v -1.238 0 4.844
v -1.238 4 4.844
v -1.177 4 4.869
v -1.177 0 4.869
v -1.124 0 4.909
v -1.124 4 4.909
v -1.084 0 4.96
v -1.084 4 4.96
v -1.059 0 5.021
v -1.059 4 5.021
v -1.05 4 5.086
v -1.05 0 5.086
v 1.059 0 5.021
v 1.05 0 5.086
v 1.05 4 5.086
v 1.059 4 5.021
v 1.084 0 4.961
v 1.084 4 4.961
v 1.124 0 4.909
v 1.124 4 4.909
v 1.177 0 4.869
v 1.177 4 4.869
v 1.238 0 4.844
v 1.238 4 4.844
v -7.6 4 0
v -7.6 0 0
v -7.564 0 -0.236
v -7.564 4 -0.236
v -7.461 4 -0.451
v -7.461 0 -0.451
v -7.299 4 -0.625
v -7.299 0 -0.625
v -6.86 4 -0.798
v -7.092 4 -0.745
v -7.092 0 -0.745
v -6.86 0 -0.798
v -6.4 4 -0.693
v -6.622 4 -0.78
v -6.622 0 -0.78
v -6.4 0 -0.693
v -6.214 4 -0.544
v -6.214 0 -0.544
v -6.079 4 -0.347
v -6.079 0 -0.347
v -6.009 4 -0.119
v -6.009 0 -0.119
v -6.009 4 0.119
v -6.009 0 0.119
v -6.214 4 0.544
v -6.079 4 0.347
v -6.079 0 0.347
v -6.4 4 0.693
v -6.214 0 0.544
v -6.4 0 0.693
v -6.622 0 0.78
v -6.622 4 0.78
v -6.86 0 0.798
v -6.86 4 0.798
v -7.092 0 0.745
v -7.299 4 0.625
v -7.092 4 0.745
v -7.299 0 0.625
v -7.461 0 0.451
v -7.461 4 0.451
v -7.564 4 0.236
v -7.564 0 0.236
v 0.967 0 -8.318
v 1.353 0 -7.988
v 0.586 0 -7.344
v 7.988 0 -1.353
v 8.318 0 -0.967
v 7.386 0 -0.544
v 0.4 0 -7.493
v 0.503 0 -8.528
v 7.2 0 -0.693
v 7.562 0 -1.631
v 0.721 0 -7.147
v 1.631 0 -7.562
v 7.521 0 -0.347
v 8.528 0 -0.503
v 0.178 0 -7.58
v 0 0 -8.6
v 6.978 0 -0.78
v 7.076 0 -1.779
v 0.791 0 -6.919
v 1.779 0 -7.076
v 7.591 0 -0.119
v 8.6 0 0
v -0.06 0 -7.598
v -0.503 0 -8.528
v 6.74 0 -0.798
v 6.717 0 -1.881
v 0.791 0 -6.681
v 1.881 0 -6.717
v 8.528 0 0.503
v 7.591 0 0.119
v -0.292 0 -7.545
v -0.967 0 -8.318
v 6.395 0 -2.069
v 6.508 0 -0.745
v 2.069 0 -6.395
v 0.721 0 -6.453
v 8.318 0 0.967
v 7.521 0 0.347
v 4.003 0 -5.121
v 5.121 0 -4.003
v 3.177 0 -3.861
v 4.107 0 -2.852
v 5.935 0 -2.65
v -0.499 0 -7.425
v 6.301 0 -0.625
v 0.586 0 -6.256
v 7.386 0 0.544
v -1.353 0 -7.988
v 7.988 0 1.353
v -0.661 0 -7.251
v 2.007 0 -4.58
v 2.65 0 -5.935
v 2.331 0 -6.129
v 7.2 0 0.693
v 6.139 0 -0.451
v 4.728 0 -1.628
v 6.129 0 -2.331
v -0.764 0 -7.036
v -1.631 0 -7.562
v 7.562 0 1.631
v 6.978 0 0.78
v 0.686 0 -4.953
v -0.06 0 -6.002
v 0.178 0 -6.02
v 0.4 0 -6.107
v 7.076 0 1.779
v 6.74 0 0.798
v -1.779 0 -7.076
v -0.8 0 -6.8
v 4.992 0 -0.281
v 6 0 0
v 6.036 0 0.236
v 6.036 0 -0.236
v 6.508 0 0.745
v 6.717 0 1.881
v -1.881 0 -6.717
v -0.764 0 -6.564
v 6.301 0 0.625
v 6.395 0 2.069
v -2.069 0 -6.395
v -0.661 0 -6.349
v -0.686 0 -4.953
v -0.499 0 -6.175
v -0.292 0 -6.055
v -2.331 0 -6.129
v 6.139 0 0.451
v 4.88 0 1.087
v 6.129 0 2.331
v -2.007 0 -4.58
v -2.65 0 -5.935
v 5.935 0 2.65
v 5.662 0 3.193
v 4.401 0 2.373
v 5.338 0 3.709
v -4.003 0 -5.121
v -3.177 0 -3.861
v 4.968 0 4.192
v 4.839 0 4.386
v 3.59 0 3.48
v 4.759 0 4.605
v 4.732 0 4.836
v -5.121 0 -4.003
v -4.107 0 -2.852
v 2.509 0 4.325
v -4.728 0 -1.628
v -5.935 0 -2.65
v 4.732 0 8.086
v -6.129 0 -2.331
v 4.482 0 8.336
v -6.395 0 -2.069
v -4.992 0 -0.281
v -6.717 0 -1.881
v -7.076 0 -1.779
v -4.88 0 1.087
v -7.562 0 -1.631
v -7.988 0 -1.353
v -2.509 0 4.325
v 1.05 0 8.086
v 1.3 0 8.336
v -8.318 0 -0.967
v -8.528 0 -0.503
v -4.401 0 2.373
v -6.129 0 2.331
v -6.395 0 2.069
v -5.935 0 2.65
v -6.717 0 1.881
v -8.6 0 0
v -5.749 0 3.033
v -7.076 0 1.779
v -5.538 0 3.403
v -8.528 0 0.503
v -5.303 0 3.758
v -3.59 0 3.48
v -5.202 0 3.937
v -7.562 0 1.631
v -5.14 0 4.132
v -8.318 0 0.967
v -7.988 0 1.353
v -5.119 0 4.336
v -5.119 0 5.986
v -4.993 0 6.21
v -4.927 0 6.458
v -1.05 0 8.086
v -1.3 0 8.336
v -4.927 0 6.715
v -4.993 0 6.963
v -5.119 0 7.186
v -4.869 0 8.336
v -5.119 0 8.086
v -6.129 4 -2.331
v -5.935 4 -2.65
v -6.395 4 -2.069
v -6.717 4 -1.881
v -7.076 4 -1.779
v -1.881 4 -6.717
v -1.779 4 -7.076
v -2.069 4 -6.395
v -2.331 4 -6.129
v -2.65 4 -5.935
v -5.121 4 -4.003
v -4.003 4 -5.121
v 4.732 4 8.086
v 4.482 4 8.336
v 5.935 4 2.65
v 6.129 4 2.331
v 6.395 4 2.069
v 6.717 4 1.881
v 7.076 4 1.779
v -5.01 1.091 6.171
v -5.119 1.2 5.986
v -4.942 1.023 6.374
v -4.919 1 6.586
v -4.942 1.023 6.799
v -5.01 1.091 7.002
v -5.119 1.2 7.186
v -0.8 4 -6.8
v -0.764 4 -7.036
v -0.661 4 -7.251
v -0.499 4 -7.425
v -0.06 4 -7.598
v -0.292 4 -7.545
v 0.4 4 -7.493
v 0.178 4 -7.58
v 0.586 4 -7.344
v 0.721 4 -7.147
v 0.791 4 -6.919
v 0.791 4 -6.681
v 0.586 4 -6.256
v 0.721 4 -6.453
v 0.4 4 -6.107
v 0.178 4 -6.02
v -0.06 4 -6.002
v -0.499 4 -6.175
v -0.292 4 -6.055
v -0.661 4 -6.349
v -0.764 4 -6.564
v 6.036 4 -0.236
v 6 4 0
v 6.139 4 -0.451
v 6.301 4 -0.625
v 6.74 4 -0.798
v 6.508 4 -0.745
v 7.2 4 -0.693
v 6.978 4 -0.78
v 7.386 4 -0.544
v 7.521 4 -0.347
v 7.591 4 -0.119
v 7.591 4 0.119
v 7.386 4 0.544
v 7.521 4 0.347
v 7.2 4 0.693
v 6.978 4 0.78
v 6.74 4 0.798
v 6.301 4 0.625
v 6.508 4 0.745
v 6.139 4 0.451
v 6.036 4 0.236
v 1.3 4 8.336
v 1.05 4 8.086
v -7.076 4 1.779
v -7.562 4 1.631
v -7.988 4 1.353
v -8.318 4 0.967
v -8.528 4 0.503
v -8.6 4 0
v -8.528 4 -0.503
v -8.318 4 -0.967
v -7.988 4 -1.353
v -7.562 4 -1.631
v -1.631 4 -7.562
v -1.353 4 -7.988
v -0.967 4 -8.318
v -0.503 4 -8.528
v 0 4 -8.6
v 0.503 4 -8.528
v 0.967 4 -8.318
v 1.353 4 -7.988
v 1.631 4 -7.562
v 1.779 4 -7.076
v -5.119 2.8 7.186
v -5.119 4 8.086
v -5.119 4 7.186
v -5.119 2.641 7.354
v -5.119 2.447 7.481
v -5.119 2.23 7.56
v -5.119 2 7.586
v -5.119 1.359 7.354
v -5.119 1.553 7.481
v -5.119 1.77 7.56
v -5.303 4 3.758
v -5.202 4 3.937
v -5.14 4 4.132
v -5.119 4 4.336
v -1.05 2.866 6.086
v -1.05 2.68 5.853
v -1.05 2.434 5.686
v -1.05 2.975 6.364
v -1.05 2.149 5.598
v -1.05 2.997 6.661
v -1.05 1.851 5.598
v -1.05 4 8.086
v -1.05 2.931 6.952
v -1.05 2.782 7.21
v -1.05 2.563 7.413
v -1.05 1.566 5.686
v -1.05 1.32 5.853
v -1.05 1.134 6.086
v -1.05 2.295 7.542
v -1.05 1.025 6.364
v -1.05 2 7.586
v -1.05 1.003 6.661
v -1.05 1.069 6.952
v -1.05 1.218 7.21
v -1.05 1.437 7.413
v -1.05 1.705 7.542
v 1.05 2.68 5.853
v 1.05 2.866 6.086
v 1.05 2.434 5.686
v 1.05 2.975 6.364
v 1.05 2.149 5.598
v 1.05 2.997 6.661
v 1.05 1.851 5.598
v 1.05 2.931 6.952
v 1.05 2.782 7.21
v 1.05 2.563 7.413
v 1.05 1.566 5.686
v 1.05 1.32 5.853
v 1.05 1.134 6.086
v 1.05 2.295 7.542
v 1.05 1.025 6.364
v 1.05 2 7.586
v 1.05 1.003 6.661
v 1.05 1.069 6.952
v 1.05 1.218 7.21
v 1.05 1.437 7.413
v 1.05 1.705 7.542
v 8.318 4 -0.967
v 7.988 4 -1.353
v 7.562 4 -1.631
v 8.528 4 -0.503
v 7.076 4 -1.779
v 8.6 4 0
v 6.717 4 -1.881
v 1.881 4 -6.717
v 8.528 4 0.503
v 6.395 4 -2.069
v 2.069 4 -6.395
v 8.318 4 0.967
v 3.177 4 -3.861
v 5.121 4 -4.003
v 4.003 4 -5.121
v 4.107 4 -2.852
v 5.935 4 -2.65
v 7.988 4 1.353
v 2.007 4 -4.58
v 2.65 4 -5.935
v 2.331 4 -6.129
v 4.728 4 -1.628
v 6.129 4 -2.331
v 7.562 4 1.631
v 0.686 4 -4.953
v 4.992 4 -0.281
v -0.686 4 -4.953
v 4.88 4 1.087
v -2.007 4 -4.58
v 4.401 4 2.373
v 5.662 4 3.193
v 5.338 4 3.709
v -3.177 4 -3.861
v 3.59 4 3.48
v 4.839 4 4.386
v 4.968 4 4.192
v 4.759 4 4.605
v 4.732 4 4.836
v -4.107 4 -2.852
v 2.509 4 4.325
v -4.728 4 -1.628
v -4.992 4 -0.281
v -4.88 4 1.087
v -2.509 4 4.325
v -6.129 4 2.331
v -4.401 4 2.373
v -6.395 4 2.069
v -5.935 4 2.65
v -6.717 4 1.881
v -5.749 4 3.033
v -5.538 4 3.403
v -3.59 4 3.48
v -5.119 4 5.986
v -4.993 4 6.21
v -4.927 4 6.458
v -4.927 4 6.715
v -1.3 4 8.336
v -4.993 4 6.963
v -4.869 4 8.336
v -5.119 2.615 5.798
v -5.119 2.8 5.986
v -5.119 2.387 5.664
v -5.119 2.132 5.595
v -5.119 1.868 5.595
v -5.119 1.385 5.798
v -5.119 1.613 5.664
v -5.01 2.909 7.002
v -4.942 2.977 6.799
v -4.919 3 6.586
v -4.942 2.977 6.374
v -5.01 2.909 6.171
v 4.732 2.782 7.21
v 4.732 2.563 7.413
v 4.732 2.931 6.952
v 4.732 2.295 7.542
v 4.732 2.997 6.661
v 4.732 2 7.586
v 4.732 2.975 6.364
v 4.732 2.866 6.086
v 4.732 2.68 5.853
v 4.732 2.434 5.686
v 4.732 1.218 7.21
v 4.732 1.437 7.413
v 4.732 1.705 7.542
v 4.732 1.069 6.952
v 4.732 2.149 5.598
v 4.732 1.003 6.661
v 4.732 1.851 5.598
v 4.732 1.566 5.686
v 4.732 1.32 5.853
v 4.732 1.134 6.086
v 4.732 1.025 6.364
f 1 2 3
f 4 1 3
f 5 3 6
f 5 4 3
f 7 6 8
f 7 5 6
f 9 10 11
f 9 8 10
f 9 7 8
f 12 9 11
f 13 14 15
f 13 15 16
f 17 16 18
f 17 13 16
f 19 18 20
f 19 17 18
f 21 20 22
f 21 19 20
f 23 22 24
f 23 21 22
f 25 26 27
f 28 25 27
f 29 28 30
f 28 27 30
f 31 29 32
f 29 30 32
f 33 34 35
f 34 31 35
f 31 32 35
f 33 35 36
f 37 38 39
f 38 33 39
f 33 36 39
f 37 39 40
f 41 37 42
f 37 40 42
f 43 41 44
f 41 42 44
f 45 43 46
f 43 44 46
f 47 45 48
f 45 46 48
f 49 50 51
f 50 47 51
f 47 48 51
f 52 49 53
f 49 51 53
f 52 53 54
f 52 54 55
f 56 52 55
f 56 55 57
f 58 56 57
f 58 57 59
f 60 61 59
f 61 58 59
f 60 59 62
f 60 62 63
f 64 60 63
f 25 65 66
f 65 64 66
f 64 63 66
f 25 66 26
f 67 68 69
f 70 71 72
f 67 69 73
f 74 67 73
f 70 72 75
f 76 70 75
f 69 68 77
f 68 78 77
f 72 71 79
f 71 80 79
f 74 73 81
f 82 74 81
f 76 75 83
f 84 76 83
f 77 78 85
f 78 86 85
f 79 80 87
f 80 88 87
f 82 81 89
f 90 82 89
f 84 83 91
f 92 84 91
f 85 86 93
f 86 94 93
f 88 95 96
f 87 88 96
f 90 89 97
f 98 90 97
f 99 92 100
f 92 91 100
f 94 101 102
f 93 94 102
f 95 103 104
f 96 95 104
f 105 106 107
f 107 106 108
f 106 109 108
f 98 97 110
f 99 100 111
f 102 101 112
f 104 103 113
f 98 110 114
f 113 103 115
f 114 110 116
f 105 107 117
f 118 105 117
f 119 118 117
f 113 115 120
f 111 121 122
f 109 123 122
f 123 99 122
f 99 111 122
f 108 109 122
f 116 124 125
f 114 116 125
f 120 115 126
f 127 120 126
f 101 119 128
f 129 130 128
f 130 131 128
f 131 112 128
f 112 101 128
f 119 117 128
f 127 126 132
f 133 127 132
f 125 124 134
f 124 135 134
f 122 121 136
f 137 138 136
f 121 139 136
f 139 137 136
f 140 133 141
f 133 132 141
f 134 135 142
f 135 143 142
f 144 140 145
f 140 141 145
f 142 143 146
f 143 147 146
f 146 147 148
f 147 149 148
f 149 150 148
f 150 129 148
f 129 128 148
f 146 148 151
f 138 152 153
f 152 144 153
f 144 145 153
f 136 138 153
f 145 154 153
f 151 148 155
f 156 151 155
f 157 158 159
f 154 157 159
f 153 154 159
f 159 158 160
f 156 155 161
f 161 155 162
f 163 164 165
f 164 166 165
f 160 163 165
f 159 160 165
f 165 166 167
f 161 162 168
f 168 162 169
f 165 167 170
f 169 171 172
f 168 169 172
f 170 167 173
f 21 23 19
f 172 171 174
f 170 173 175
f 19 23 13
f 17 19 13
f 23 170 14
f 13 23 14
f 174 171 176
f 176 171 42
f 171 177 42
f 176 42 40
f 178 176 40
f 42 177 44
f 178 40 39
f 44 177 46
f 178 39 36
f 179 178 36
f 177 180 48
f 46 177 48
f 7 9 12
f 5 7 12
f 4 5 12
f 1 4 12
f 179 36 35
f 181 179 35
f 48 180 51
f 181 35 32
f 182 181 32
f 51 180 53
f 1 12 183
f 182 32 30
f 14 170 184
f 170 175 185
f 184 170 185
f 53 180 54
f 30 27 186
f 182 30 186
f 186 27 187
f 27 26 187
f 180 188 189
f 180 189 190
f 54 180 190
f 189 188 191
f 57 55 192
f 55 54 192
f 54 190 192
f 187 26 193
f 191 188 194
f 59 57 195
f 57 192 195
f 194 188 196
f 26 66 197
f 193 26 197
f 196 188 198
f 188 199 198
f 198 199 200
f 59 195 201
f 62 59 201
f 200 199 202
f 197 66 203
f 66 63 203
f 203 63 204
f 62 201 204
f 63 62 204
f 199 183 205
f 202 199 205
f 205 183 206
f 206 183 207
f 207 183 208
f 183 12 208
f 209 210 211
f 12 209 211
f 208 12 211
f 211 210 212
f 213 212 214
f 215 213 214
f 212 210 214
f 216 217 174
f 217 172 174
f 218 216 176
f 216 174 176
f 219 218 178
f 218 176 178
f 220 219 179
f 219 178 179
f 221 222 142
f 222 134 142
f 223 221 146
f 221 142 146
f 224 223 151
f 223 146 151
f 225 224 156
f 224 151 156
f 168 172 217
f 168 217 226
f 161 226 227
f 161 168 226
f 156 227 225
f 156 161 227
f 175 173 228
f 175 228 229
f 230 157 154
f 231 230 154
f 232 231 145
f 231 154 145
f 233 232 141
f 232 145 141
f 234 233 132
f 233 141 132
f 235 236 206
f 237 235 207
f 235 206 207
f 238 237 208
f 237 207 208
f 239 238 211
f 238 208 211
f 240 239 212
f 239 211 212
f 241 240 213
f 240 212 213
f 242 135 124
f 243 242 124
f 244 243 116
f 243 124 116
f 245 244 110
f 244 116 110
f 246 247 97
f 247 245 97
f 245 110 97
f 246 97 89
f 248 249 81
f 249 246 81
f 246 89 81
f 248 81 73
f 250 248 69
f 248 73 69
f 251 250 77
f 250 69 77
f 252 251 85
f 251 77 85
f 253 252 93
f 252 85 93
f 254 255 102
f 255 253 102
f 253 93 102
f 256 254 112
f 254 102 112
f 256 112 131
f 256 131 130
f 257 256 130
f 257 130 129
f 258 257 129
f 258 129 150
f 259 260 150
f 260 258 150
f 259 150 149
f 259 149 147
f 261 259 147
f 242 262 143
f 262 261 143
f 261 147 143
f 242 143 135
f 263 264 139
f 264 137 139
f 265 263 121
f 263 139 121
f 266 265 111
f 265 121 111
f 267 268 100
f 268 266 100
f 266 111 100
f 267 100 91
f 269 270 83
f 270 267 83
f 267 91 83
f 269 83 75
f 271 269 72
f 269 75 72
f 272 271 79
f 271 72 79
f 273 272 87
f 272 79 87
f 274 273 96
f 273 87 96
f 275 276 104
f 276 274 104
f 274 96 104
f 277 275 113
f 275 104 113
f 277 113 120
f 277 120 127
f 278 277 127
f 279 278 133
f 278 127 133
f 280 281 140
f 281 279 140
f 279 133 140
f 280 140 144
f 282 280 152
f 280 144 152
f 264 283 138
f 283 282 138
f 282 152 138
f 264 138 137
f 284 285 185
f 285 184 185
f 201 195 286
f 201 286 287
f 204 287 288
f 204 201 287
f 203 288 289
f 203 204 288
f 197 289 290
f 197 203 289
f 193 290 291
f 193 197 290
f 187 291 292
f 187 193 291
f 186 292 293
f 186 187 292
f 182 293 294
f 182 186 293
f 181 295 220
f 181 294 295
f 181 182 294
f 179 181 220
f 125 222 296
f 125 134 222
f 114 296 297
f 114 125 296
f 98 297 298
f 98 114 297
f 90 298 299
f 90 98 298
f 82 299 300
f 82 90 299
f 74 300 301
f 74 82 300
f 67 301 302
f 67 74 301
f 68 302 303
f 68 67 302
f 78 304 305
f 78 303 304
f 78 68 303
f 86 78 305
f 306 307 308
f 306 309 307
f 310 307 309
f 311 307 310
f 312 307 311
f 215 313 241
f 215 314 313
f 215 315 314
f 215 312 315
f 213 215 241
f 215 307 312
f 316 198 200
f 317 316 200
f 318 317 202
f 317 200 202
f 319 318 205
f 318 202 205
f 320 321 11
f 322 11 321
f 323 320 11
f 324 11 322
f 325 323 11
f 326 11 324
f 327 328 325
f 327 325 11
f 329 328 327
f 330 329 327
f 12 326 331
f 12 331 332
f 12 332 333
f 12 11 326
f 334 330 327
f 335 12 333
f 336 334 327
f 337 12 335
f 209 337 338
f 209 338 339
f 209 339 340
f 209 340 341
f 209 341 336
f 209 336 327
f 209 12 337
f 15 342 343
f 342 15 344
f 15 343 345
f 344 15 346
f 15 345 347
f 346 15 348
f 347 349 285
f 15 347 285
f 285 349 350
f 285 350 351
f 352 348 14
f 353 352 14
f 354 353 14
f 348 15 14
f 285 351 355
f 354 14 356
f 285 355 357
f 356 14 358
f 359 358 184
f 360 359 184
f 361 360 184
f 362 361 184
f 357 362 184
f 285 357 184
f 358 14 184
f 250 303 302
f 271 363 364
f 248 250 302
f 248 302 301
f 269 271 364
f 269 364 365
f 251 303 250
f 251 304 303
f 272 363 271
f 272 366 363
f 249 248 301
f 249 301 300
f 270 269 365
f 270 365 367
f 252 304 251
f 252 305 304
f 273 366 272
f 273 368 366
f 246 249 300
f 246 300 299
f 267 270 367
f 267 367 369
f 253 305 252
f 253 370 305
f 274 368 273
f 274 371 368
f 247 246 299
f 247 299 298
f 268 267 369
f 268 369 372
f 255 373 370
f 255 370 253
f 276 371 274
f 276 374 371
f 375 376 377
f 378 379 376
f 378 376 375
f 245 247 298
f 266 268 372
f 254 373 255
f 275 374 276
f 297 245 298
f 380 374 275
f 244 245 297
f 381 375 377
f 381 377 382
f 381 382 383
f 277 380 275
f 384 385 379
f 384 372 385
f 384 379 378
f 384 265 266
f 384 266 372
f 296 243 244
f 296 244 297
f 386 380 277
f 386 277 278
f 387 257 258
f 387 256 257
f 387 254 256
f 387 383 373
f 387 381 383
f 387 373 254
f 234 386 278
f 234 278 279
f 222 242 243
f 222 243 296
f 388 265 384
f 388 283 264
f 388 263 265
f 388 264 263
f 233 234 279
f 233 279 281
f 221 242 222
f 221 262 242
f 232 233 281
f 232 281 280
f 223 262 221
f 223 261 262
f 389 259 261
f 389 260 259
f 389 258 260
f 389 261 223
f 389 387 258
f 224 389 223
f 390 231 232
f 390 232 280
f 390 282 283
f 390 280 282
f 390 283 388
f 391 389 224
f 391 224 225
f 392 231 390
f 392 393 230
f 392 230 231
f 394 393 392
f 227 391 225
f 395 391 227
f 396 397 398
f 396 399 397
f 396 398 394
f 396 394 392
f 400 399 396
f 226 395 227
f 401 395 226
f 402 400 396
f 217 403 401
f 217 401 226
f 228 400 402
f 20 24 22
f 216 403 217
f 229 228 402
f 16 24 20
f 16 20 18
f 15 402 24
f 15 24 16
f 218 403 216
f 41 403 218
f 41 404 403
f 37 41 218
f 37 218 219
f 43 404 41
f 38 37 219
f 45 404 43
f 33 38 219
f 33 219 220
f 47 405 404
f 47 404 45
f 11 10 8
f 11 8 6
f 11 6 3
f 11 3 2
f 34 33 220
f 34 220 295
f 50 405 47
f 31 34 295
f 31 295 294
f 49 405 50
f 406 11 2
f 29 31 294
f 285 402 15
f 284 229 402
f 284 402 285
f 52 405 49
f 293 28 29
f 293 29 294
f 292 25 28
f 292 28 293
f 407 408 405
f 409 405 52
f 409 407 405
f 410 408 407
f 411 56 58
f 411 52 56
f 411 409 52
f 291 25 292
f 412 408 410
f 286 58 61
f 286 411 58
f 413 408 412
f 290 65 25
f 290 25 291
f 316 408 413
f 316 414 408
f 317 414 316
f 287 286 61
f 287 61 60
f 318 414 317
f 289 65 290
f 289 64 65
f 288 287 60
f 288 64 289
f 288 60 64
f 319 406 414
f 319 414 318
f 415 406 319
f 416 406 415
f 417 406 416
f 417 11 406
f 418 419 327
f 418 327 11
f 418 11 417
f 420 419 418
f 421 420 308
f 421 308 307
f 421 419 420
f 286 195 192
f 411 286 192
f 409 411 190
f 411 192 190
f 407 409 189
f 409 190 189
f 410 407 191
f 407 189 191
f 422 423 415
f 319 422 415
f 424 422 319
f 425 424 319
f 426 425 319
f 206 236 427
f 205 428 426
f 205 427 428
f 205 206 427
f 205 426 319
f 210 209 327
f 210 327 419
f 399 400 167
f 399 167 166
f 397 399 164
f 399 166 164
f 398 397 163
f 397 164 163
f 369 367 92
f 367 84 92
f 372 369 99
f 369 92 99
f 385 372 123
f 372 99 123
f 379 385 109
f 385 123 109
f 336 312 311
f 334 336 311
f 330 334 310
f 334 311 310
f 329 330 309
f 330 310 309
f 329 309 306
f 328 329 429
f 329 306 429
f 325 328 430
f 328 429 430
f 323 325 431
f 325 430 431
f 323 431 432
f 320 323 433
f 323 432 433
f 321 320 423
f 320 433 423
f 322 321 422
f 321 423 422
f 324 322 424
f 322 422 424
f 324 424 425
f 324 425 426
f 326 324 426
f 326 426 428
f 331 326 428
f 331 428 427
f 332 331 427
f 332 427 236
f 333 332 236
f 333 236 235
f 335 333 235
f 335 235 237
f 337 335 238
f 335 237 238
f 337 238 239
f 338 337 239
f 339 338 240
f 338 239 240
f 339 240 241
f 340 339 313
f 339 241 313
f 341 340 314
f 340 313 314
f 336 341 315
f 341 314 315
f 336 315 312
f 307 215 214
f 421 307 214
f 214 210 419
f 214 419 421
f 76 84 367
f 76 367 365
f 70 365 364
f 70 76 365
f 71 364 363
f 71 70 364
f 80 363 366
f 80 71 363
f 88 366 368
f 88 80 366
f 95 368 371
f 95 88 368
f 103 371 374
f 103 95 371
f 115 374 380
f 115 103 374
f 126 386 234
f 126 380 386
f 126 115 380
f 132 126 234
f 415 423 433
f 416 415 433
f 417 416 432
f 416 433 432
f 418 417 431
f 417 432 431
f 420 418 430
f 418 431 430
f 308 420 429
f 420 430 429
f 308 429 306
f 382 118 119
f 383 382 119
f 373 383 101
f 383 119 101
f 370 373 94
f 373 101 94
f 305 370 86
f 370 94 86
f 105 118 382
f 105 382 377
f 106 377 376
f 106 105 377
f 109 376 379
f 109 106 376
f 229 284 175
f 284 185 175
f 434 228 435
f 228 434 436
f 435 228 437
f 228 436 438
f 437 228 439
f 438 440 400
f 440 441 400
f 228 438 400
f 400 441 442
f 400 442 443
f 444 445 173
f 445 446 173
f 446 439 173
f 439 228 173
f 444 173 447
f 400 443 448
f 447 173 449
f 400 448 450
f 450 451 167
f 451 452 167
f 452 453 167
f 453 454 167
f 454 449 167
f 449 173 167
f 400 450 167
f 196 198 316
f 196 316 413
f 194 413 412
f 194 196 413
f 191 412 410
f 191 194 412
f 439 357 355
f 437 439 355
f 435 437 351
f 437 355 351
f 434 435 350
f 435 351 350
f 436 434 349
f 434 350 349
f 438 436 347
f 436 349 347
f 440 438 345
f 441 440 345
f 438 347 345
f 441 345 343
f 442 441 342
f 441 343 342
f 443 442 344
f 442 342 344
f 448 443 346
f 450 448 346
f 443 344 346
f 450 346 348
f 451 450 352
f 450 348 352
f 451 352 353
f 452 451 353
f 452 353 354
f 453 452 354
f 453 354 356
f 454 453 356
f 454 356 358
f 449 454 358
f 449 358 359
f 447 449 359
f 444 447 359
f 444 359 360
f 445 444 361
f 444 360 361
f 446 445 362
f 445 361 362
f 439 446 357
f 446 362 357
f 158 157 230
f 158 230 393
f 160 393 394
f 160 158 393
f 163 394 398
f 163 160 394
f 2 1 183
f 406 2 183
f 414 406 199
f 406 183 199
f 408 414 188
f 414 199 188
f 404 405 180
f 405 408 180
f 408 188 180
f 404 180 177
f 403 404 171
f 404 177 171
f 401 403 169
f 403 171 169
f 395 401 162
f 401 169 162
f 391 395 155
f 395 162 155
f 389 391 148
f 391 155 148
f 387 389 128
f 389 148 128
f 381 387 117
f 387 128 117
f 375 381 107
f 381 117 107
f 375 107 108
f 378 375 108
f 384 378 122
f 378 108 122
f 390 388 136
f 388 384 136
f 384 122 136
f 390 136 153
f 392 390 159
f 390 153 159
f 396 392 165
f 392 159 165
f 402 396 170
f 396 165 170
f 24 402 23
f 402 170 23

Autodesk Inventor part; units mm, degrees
ref_plane "YZ Plane" through (0, 0, 0) normal (1, 0, 0) x (0, 1, 0)
ref_plane "XZ Plane" through (0, 0, 0) normal (0, 1, 0) x (-1, 0, 0)
ref_plane "XY Plane" through (0, 0, 0) normal (0, 0, 1) x (1, 0, 0)
sketch "スケッチ1" plane through (0, 0, 0) normal (0, 1, 0) x (-1, 0, 0)
  arc A0 (-1.2381, 4.8443) -> (1.2381, 4.8443) centre (0, 0) ccw
  line L0 (1.05, 5.0865) -> (1.05, 8.0865)
  line L1 (1.3, 8.3365) -> (4.8692, 8.3365)
  line L2 (-1.05, 5.0865) -> (-1.05, 8.0865)
  line L3 (-1.3, 8.3365) -> (-4.4822, 8.3365)
  line L4 (-4.7322, 8.0865) -> (-4.7322, 4.8365)
  line L5 (0, 0) -> (0, 8.2759) construction
  arc A1 (1.05, 5.0865) -> (1.2381, 4.8443) centre (1.3, 5.0865) ccw
  arc A2 (-1.2381, 4.8443) -> (-1.05, 5.0865) centre (-1.3, 5.0865) ccw
  arc A3 (-1.7788, -7.0755) -> (1.7788, -7.0755) centre (0, -6.8) ccw
  arc A4 (-4.9679, 4.1916) -> (-5.9354, 2.6497) centre (0, 0) ccw
  arc A5 (2.6497, -5.9354) -> (5.9354, -2.6497) centre (0, 0) ccw
  line L6 (0, -6.8) -> (0, 0) construction
  arc A6 (2.6497, -5.9354) -> (1.7788, -7.0755) centre (3.2611, -7.3051) ccw
  arc A7 (-1.7788, -7.0755) -> (-2.6497, -5.9354) centre (-3.2611, -7.3051) ccw
  circle A8 centre (0, -6.8) radius 0.8
  arc A9 (5.1192, 4.3365) -> (5.3033, 3.7583) centre (6.1192, 4.3365) ccw
  arc A10 (-4.9679, 4.1916) -> (-4.7322, 4.8365) centre (-5.7322, 4.8365) ccw
  line L7 (1.05, 8.0865) -> (1.3, 8.3365)
  line L8 (-1.05, 8.0865) -> (-1.3, 8.3365)
  arc A11 (5.1192, 7.1865) -> (5.1192, 5.9865) centre (5.9192, 6.5865) ccw
  line L9 (5.1192, 8.0865) -> (5.1192, 7.1865)
  line L10 (5.1192, 5.9865) -> (5.1192, 4.3365)
  line L11 (1.05, 6.5865) -> (5.9192, 6.5865) construction
  line L12 (5.1192, 8.0865) -> (4.8692, 8.3365)
  line L13 (-4.7322, 8.0865) -> (-4.4822, 8.3365)
  arc A12 (7.0755, -1.7788) -> (7.0755, 1.7788) centre (6.8, 0) ccw
  arc A13 (6.2684, -1.7197) -> (6.2684, 1.7197) centre (0, 0) ccw construction
  arc A14 (5.9354, 2.6497) -> (5.3033, 3.7583) centre (0, 0) ccw
  circle A15 centre (6.8, 0) radius 0.8
  arc A16 (7.0755, -1.7788) -> (5.9354, -2.6497) centre (7.3051, -3.2611) ccw
  arc A17 (5.9354, 2.6497) -> (7.0755, 1.7788) centre (7.3051, 3.2611) ccw
  line L14 (6.8, 0) -> (0, 0) construction
  arc A18 (-7.0755, 1.7788) -> (-7.0755, -1.7788) centre (-6.8, 0) ccw
  circle A19 centre (-6.8, 0) radius 0.8
  arc A20 (-5.9354, -2.6497) -> (-7.0755, -1.7788) centre (-7.3051, -3.2611) ccw
  arc A21 (-7.0755, 1.7788) -> (-5.9354, 2.6497) centre (-7.3051, 3.2611) ccw
  arc A22 (-5.9354, -2.6497) -> (-2.6497, -5.9354) centre (0, 0) ccw
  arc A23 (-5.9354, 2.6497) -> (-5.9354, -2.6497) centre (0, 0) ccw construction
  point P0 (-1.05, 4.8885)
  point P1 (1.05, 4.8885)
  point P2 (1.05, 8.3365)
  point P3 (5.1192, 8.3365)
  point P4 (5.1192, 4.0055)
  point P5 (-1.05, 8.3365)
  point P6 (-4.7322, 8.3365)
  point P7 (-4.7322, 4.456)
  dimension "d0" = 5
  dimension "d1" = 2.1
  dimension "d2" = 0.25
  dimension "d8" = 6.5
  dimension "d9" = 1.8
  dimension "d11" = 1.5
  dimension "d12" = 1.6
  dimension "d13" = 1
  dimension "d14" = 4
  dimension "d15" = 3.5
  dimension "d16" = 0.25
  dimension "d17" = 0.25
  dimension "d18" = 0.25
  dimension "d19" = 0.25
  dimension "d20" = 3
  dimension "d21" = 1
  dimension "d22" = 0.8
  dimension "d23" = 0.25
  dimension "d24" = 0.25
  dimension "d25" = 0.25
  dimension "d26" = 0.25
  dimension "d27" = 1.5
extrude "押し出し1" add sketch "スケッチ1" along normal blind 4
sketch "スケッチ2" plane through (-5.1192, 0, 7.1865) normal (-1, 0, 0) x (0, 0, 1)
  circle A0 centre (-0.6, 2) radius 1
  line L0 (-0.6, 2) -> (-0.6, 4) construction
  line L1 (-2.1, 4) -> (0.9, 4) construction
  point P0 (-7.1865, 0)
  dimension "d30" = 2
  dimension "d31" = 2
extrude "押し出し2" cut sketch "スケッチ2" against normal blind 10
equation "\"d17\" = d16"
equation "\"d18\" = d16"
equation "\"d19\" = d18"
equation "\"d24\" = d23"
equation "\"d25\" = d23"
equation "\"d26\" = d25"
properties part number "lod_holder" material "アルミニウム 6061"
